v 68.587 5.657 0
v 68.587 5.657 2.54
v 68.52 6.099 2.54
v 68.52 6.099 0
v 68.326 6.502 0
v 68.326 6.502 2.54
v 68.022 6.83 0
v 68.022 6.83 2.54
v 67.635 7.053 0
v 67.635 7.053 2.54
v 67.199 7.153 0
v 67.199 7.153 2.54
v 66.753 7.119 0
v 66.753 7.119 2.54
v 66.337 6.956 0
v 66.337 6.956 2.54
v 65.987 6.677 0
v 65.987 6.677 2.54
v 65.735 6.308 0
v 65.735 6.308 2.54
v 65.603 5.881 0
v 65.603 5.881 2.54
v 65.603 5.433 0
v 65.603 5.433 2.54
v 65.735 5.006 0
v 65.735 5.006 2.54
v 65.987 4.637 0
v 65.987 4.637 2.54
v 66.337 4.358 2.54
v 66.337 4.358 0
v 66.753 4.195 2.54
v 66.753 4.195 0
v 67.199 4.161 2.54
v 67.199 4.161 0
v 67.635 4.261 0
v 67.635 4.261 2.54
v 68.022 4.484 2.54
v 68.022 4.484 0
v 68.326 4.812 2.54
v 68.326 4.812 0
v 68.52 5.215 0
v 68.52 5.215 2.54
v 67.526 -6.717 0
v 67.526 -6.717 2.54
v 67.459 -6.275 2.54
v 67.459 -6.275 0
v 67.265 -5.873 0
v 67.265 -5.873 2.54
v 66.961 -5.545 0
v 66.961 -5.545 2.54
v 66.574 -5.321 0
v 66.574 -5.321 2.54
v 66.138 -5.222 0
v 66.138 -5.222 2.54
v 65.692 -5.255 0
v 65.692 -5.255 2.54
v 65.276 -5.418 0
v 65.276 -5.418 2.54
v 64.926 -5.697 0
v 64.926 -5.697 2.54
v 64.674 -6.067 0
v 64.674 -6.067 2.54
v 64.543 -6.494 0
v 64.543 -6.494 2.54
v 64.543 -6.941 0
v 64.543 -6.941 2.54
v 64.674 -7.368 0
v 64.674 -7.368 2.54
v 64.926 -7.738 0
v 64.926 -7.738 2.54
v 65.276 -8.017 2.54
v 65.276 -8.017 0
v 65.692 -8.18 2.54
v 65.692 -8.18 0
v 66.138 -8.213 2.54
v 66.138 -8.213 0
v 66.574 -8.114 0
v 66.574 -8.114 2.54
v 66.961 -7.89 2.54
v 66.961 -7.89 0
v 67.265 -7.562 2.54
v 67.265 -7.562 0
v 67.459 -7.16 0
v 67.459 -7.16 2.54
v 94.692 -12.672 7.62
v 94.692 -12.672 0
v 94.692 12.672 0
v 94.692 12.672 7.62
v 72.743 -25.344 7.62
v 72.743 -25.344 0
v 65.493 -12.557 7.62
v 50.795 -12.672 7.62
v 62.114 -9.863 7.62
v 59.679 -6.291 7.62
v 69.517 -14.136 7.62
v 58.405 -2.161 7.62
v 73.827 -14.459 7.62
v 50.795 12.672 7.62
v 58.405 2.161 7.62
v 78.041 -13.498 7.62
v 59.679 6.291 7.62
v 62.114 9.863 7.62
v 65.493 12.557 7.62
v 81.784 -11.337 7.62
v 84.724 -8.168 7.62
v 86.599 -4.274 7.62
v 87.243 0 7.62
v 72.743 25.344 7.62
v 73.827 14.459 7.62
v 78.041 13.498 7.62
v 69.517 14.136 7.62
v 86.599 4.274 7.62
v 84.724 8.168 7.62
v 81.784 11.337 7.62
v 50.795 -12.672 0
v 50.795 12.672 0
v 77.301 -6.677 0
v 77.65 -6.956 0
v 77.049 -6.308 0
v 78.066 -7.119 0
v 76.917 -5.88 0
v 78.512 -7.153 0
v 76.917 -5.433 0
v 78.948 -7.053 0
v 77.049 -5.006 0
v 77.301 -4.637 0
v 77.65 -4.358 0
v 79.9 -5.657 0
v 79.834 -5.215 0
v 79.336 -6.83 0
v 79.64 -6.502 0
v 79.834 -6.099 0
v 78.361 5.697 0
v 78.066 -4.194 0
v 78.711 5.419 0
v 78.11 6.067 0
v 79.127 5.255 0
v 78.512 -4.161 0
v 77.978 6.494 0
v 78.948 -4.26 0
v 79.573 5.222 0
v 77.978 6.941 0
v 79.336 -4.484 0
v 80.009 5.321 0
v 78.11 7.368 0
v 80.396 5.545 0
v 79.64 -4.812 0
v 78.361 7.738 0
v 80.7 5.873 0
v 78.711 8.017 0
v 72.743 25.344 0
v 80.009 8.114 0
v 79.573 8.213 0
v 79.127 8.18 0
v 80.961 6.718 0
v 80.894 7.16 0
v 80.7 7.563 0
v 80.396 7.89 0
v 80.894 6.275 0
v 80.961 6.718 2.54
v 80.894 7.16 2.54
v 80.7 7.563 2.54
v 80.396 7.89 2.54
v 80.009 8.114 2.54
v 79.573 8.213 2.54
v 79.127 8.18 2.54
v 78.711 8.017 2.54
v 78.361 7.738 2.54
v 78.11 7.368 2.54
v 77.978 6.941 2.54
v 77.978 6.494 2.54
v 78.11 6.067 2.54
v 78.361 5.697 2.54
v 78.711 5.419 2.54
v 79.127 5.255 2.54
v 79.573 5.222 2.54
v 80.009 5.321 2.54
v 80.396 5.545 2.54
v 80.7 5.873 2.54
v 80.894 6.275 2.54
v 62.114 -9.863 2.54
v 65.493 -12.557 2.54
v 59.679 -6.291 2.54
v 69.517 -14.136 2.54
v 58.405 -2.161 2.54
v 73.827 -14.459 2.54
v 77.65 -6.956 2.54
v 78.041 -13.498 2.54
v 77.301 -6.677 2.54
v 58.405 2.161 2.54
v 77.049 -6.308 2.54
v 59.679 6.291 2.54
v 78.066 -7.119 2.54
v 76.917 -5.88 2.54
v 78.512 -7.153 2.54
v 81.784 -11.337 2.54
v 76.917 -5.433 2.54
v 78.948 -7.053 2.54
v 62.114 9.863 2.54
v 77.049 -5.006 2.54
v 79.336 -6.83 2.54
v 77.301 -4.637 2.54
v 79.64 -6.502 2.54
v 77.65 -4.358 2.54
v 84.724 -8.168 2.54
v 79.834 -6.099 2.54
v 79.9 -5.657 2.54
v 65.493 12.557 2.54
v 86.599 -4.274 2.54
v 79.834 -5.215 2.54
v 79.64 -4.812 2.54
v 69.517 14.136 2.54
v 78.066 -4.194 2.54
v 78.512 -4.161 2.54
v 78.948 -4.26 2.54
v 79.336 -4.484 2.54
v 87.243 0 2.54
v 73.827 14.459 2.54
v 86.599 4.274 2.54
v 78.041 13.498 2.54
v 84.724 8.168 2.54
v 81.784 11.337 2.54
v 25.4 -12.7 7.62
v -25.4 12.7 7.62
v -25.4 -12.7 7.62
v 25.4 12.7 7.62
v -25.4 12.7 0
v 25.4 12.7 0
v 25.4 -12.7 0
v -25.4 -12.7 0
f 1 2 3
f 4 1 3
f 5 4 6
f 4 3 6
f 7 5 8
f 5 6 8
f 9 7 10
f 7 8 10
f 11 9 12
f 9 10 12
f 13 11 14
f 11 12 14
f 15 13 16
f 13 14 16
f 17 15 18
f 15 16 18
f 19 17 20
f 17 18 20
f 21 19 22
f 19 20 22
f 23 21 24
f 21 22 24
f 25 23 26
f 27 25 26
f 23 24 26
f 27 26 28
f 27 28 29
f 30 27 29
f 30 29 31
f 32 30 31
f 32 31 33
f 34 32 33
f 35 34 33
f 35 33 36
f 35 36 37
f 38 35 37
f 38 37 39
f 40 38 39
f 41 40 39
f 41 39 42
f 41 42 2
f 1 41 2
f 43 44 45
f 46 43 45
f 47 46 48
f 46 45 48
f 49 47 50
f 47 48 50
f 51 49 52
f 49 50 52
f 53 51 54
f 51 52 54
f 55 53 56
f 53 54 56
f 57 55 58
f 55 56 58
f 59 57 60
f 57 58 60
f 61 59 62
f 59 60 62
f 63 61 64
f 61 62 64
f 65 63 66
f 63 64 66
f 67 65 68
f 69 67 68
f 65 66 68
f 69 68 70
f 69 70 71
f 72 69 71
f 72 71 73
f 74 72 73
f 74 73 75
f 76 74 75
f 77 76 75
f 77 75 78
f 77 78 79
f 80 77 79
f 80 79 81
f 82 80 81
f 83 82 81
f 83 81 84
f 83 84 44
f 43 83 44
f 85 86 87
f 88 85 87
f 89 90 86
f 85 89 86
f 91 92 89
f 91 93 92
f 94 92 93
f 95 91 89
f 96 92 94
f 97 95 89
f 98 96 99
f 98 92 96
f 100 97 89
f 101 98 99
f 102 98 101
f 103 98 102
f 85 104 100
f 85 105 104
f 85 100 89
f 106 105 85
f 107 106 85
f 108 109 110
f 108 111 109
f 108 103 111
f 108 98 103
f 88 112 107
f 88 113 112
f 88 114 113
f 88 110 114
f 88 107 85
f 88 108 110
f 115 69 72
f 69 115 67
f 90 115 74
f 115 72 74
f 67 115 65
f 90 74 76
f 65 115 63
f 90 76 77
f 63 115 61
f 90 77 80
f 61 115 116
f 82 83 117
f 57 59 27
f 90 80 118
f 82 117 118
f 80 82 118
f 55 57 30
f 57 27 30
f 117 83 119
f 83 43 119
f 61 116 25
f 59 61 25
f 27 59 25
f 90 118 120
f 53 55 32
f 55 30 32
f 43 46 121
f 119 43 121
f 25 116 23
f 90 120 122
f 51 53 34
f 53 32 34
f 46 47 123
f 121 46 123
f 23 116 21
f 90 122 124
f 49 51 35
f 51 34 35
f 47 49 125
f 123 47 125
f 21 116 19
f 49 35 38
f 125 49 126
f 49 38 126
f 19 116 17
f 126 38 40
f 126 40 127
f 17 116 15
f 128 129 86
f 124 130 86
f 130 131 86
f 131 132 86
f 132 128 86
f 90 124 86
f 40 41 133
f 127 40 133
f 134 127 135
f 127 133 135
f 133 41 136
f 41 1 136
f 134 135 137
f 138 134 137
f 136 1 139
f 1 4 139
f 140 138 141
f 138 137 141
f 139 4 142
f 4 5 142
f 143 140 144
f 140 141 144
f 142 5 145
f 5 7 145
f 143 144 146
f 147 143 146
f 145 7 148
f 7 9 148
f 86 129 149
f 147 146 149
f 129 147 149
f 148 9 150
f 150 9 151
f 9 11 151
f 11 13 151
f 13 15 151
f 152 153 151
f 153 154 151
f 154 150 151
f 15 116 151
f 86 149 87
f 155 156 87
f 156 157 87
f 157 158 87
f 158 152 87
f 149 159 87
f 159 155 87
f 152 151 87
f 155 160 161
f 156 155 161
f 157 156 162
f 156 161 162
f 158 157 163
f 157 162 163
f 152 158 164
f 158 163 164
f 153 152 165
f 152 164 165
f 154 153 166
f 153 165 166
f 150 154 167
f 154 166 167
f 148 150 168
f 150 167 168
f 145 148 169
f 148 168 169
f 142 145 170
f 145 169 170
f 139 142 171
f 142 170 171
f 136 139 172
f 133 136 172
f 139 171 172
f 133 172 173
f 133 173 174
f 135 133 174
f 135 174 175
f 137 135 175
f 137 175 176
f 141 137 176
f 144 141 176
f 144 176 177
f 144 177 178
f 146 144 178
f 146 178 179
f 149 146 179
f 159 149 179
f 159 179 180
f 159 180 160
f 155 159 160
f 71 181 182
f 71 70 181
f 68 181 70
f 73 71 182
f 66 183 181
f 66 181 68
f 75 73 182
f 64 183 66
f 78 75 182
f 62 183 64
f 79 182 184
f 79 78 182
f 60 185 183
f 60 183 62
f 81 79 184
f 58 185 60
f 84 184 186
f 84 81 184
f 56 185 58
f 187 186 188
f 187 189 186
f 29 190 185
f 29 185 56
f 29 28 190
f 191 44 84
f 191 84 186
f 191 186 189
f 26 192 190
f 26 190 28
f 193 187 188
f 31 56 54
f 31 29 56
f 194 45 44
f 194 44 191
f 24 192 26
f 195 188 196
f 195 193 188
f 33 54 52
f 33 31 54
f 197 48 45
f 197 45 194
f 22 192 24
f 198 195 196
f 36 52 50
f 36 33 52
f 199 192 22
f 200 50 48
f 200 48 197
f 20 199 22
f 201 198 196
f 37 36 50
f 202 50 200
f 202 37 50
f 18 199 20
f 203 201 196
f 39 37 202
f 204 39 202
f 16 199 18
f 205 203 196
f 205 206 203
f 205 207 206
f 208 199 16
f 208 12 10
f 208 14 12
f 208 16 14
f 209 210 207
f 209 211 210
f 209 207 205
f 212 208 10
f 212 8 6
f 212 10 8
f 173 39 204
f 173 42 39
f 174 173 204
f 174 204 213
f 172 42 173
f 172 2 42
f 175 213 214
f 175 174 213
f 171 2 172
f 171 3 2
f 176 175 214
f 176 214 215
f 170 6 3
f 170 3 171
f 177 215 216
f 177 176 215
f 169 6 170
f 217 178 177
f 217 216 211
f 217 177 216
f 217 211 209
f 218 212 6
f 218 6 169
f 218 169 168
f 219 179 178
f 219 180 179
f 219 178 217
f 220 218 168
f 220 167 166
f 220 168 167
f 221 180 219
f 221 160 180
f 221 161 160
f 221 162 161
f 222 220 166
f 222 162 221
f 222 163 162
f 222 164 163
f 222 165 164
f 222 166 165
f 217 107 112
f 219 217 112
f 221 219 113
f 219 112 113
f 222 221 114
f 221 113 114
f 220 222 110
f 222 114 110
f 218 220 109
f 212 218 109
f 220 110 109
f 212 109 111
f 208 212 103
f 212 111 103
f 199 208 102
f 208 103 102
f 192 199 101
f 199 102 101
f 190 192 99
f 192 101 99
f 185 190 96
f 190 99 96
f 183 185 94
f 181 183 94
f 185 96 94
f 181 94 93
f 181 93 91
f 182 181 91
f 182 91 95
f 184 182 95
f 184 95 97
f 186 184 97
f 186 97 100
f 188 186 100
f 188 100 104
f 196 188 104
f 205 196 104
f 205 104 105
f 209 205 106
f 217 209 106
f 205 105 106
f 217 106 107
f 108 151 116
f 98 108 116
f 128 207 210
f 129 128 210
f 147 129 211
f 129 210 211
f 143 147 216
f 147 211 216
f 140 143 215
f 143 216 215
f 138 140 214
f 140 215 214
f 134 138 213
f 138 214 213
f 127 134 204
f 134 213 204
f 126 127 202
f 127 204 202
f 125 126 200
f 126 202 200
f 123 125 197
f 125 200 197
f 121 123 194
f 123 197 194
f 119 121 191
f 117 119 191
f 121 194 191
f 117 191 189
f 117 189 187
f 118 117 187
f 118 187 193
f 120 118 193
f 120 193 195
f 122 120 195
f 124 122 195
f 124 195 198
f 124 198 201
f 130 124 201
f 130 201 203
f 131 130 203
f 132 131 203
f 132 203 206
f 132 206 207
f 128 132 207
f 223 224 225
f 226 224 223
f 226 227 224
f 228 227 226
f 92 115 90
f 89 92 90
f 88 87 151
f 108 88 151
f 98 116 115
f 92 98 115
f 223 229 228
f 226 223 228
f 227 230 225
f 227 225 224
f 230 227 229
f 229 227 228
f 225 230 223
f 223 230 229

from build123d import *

# Parameters (mm, degrees)
F2_DEPTH  = 7.62
F3_R      = 14.5
F4_DEPTH  = 5.08
F6_R      = 1.5
F10_DEPTH = 2.541
F7_R      = 1.5
F11_DEPTH = 2.541
F8_R      = 1.5
F12_DEPTH = 2.541
F9_R      = 1.5
F13_DEPTH = 2.541
F0_W      = 50.8
F0_H      = 25.4
F14_DEPTH = 7.62


with BuildPart() as f2:
    # F1 (on Top) → F2 (new body)
    with BuildSketch(Plane.XY):
        Polygon((94.692336, -12.672174), (94.692336, 12.672174), (72.743488, 25.344348), (50.794639, 12.672174), (50.794639, -12.672174), (72.743488, -25.344348), align=None)
    extrude(amount=F2_DEPTH)

    # F3 (on face) → F4 (cut)
    with BuildSketch(Plane.XY.offset(7.62)):
        with Locations((72.743488, 0)):
            Circle(F3_R)
    extrude(amount=-F4_DEPTH, mode=Mode.SUBTRACT)

    # F6 (on face) → F10 (cut, through all)
    with BuildSketch(Plane.XY.offset(2.54)):
        with Locations((67.086555, 5.656938)):
            Circle(F6_R)
    extrude(amount=-F10_DEPTH, mode=Mode.SUBTRACT)

    # F7 (on face) → F11 (cut, through all)
    with BuildSketch(Plane.XY.offset(2.54)):
        with Locations((79.460986, 6.717544)):
            Circle(F7_R)
    extrude(amount=-F11_DEPTH, mode=Mode.SUBTRACT)

    # F8 (on face) → F12 (cut, through all)
    with BuildSketch(Plane.XY.offset(2.54)):
        with Locations((78.400277, -5.656807)):
            Circle(F8_R)
    extrude(amount=-F12_DEPTH, mode=Mode.SUBTRACT)

    # F9 (on face) → F13 (cut, through all)
    with BuildSketch(Plane.XY.offset(2.54)):
        with Locations((66.025883, -6.717487)):
            Circle(F9_R)
    extrude(amount=-F13_DEPTH, mode=Mode.SUBTRACT)


with BuildPart() as f14:
    # F0 (on Top) → F14 (new body)
    with BuildSketch(Plane.XY):
        Rectangle(F0_W, F0_H)
    extrude(amount=F14_DEPTH)


solid = Compound([f2.part, f14.part])
